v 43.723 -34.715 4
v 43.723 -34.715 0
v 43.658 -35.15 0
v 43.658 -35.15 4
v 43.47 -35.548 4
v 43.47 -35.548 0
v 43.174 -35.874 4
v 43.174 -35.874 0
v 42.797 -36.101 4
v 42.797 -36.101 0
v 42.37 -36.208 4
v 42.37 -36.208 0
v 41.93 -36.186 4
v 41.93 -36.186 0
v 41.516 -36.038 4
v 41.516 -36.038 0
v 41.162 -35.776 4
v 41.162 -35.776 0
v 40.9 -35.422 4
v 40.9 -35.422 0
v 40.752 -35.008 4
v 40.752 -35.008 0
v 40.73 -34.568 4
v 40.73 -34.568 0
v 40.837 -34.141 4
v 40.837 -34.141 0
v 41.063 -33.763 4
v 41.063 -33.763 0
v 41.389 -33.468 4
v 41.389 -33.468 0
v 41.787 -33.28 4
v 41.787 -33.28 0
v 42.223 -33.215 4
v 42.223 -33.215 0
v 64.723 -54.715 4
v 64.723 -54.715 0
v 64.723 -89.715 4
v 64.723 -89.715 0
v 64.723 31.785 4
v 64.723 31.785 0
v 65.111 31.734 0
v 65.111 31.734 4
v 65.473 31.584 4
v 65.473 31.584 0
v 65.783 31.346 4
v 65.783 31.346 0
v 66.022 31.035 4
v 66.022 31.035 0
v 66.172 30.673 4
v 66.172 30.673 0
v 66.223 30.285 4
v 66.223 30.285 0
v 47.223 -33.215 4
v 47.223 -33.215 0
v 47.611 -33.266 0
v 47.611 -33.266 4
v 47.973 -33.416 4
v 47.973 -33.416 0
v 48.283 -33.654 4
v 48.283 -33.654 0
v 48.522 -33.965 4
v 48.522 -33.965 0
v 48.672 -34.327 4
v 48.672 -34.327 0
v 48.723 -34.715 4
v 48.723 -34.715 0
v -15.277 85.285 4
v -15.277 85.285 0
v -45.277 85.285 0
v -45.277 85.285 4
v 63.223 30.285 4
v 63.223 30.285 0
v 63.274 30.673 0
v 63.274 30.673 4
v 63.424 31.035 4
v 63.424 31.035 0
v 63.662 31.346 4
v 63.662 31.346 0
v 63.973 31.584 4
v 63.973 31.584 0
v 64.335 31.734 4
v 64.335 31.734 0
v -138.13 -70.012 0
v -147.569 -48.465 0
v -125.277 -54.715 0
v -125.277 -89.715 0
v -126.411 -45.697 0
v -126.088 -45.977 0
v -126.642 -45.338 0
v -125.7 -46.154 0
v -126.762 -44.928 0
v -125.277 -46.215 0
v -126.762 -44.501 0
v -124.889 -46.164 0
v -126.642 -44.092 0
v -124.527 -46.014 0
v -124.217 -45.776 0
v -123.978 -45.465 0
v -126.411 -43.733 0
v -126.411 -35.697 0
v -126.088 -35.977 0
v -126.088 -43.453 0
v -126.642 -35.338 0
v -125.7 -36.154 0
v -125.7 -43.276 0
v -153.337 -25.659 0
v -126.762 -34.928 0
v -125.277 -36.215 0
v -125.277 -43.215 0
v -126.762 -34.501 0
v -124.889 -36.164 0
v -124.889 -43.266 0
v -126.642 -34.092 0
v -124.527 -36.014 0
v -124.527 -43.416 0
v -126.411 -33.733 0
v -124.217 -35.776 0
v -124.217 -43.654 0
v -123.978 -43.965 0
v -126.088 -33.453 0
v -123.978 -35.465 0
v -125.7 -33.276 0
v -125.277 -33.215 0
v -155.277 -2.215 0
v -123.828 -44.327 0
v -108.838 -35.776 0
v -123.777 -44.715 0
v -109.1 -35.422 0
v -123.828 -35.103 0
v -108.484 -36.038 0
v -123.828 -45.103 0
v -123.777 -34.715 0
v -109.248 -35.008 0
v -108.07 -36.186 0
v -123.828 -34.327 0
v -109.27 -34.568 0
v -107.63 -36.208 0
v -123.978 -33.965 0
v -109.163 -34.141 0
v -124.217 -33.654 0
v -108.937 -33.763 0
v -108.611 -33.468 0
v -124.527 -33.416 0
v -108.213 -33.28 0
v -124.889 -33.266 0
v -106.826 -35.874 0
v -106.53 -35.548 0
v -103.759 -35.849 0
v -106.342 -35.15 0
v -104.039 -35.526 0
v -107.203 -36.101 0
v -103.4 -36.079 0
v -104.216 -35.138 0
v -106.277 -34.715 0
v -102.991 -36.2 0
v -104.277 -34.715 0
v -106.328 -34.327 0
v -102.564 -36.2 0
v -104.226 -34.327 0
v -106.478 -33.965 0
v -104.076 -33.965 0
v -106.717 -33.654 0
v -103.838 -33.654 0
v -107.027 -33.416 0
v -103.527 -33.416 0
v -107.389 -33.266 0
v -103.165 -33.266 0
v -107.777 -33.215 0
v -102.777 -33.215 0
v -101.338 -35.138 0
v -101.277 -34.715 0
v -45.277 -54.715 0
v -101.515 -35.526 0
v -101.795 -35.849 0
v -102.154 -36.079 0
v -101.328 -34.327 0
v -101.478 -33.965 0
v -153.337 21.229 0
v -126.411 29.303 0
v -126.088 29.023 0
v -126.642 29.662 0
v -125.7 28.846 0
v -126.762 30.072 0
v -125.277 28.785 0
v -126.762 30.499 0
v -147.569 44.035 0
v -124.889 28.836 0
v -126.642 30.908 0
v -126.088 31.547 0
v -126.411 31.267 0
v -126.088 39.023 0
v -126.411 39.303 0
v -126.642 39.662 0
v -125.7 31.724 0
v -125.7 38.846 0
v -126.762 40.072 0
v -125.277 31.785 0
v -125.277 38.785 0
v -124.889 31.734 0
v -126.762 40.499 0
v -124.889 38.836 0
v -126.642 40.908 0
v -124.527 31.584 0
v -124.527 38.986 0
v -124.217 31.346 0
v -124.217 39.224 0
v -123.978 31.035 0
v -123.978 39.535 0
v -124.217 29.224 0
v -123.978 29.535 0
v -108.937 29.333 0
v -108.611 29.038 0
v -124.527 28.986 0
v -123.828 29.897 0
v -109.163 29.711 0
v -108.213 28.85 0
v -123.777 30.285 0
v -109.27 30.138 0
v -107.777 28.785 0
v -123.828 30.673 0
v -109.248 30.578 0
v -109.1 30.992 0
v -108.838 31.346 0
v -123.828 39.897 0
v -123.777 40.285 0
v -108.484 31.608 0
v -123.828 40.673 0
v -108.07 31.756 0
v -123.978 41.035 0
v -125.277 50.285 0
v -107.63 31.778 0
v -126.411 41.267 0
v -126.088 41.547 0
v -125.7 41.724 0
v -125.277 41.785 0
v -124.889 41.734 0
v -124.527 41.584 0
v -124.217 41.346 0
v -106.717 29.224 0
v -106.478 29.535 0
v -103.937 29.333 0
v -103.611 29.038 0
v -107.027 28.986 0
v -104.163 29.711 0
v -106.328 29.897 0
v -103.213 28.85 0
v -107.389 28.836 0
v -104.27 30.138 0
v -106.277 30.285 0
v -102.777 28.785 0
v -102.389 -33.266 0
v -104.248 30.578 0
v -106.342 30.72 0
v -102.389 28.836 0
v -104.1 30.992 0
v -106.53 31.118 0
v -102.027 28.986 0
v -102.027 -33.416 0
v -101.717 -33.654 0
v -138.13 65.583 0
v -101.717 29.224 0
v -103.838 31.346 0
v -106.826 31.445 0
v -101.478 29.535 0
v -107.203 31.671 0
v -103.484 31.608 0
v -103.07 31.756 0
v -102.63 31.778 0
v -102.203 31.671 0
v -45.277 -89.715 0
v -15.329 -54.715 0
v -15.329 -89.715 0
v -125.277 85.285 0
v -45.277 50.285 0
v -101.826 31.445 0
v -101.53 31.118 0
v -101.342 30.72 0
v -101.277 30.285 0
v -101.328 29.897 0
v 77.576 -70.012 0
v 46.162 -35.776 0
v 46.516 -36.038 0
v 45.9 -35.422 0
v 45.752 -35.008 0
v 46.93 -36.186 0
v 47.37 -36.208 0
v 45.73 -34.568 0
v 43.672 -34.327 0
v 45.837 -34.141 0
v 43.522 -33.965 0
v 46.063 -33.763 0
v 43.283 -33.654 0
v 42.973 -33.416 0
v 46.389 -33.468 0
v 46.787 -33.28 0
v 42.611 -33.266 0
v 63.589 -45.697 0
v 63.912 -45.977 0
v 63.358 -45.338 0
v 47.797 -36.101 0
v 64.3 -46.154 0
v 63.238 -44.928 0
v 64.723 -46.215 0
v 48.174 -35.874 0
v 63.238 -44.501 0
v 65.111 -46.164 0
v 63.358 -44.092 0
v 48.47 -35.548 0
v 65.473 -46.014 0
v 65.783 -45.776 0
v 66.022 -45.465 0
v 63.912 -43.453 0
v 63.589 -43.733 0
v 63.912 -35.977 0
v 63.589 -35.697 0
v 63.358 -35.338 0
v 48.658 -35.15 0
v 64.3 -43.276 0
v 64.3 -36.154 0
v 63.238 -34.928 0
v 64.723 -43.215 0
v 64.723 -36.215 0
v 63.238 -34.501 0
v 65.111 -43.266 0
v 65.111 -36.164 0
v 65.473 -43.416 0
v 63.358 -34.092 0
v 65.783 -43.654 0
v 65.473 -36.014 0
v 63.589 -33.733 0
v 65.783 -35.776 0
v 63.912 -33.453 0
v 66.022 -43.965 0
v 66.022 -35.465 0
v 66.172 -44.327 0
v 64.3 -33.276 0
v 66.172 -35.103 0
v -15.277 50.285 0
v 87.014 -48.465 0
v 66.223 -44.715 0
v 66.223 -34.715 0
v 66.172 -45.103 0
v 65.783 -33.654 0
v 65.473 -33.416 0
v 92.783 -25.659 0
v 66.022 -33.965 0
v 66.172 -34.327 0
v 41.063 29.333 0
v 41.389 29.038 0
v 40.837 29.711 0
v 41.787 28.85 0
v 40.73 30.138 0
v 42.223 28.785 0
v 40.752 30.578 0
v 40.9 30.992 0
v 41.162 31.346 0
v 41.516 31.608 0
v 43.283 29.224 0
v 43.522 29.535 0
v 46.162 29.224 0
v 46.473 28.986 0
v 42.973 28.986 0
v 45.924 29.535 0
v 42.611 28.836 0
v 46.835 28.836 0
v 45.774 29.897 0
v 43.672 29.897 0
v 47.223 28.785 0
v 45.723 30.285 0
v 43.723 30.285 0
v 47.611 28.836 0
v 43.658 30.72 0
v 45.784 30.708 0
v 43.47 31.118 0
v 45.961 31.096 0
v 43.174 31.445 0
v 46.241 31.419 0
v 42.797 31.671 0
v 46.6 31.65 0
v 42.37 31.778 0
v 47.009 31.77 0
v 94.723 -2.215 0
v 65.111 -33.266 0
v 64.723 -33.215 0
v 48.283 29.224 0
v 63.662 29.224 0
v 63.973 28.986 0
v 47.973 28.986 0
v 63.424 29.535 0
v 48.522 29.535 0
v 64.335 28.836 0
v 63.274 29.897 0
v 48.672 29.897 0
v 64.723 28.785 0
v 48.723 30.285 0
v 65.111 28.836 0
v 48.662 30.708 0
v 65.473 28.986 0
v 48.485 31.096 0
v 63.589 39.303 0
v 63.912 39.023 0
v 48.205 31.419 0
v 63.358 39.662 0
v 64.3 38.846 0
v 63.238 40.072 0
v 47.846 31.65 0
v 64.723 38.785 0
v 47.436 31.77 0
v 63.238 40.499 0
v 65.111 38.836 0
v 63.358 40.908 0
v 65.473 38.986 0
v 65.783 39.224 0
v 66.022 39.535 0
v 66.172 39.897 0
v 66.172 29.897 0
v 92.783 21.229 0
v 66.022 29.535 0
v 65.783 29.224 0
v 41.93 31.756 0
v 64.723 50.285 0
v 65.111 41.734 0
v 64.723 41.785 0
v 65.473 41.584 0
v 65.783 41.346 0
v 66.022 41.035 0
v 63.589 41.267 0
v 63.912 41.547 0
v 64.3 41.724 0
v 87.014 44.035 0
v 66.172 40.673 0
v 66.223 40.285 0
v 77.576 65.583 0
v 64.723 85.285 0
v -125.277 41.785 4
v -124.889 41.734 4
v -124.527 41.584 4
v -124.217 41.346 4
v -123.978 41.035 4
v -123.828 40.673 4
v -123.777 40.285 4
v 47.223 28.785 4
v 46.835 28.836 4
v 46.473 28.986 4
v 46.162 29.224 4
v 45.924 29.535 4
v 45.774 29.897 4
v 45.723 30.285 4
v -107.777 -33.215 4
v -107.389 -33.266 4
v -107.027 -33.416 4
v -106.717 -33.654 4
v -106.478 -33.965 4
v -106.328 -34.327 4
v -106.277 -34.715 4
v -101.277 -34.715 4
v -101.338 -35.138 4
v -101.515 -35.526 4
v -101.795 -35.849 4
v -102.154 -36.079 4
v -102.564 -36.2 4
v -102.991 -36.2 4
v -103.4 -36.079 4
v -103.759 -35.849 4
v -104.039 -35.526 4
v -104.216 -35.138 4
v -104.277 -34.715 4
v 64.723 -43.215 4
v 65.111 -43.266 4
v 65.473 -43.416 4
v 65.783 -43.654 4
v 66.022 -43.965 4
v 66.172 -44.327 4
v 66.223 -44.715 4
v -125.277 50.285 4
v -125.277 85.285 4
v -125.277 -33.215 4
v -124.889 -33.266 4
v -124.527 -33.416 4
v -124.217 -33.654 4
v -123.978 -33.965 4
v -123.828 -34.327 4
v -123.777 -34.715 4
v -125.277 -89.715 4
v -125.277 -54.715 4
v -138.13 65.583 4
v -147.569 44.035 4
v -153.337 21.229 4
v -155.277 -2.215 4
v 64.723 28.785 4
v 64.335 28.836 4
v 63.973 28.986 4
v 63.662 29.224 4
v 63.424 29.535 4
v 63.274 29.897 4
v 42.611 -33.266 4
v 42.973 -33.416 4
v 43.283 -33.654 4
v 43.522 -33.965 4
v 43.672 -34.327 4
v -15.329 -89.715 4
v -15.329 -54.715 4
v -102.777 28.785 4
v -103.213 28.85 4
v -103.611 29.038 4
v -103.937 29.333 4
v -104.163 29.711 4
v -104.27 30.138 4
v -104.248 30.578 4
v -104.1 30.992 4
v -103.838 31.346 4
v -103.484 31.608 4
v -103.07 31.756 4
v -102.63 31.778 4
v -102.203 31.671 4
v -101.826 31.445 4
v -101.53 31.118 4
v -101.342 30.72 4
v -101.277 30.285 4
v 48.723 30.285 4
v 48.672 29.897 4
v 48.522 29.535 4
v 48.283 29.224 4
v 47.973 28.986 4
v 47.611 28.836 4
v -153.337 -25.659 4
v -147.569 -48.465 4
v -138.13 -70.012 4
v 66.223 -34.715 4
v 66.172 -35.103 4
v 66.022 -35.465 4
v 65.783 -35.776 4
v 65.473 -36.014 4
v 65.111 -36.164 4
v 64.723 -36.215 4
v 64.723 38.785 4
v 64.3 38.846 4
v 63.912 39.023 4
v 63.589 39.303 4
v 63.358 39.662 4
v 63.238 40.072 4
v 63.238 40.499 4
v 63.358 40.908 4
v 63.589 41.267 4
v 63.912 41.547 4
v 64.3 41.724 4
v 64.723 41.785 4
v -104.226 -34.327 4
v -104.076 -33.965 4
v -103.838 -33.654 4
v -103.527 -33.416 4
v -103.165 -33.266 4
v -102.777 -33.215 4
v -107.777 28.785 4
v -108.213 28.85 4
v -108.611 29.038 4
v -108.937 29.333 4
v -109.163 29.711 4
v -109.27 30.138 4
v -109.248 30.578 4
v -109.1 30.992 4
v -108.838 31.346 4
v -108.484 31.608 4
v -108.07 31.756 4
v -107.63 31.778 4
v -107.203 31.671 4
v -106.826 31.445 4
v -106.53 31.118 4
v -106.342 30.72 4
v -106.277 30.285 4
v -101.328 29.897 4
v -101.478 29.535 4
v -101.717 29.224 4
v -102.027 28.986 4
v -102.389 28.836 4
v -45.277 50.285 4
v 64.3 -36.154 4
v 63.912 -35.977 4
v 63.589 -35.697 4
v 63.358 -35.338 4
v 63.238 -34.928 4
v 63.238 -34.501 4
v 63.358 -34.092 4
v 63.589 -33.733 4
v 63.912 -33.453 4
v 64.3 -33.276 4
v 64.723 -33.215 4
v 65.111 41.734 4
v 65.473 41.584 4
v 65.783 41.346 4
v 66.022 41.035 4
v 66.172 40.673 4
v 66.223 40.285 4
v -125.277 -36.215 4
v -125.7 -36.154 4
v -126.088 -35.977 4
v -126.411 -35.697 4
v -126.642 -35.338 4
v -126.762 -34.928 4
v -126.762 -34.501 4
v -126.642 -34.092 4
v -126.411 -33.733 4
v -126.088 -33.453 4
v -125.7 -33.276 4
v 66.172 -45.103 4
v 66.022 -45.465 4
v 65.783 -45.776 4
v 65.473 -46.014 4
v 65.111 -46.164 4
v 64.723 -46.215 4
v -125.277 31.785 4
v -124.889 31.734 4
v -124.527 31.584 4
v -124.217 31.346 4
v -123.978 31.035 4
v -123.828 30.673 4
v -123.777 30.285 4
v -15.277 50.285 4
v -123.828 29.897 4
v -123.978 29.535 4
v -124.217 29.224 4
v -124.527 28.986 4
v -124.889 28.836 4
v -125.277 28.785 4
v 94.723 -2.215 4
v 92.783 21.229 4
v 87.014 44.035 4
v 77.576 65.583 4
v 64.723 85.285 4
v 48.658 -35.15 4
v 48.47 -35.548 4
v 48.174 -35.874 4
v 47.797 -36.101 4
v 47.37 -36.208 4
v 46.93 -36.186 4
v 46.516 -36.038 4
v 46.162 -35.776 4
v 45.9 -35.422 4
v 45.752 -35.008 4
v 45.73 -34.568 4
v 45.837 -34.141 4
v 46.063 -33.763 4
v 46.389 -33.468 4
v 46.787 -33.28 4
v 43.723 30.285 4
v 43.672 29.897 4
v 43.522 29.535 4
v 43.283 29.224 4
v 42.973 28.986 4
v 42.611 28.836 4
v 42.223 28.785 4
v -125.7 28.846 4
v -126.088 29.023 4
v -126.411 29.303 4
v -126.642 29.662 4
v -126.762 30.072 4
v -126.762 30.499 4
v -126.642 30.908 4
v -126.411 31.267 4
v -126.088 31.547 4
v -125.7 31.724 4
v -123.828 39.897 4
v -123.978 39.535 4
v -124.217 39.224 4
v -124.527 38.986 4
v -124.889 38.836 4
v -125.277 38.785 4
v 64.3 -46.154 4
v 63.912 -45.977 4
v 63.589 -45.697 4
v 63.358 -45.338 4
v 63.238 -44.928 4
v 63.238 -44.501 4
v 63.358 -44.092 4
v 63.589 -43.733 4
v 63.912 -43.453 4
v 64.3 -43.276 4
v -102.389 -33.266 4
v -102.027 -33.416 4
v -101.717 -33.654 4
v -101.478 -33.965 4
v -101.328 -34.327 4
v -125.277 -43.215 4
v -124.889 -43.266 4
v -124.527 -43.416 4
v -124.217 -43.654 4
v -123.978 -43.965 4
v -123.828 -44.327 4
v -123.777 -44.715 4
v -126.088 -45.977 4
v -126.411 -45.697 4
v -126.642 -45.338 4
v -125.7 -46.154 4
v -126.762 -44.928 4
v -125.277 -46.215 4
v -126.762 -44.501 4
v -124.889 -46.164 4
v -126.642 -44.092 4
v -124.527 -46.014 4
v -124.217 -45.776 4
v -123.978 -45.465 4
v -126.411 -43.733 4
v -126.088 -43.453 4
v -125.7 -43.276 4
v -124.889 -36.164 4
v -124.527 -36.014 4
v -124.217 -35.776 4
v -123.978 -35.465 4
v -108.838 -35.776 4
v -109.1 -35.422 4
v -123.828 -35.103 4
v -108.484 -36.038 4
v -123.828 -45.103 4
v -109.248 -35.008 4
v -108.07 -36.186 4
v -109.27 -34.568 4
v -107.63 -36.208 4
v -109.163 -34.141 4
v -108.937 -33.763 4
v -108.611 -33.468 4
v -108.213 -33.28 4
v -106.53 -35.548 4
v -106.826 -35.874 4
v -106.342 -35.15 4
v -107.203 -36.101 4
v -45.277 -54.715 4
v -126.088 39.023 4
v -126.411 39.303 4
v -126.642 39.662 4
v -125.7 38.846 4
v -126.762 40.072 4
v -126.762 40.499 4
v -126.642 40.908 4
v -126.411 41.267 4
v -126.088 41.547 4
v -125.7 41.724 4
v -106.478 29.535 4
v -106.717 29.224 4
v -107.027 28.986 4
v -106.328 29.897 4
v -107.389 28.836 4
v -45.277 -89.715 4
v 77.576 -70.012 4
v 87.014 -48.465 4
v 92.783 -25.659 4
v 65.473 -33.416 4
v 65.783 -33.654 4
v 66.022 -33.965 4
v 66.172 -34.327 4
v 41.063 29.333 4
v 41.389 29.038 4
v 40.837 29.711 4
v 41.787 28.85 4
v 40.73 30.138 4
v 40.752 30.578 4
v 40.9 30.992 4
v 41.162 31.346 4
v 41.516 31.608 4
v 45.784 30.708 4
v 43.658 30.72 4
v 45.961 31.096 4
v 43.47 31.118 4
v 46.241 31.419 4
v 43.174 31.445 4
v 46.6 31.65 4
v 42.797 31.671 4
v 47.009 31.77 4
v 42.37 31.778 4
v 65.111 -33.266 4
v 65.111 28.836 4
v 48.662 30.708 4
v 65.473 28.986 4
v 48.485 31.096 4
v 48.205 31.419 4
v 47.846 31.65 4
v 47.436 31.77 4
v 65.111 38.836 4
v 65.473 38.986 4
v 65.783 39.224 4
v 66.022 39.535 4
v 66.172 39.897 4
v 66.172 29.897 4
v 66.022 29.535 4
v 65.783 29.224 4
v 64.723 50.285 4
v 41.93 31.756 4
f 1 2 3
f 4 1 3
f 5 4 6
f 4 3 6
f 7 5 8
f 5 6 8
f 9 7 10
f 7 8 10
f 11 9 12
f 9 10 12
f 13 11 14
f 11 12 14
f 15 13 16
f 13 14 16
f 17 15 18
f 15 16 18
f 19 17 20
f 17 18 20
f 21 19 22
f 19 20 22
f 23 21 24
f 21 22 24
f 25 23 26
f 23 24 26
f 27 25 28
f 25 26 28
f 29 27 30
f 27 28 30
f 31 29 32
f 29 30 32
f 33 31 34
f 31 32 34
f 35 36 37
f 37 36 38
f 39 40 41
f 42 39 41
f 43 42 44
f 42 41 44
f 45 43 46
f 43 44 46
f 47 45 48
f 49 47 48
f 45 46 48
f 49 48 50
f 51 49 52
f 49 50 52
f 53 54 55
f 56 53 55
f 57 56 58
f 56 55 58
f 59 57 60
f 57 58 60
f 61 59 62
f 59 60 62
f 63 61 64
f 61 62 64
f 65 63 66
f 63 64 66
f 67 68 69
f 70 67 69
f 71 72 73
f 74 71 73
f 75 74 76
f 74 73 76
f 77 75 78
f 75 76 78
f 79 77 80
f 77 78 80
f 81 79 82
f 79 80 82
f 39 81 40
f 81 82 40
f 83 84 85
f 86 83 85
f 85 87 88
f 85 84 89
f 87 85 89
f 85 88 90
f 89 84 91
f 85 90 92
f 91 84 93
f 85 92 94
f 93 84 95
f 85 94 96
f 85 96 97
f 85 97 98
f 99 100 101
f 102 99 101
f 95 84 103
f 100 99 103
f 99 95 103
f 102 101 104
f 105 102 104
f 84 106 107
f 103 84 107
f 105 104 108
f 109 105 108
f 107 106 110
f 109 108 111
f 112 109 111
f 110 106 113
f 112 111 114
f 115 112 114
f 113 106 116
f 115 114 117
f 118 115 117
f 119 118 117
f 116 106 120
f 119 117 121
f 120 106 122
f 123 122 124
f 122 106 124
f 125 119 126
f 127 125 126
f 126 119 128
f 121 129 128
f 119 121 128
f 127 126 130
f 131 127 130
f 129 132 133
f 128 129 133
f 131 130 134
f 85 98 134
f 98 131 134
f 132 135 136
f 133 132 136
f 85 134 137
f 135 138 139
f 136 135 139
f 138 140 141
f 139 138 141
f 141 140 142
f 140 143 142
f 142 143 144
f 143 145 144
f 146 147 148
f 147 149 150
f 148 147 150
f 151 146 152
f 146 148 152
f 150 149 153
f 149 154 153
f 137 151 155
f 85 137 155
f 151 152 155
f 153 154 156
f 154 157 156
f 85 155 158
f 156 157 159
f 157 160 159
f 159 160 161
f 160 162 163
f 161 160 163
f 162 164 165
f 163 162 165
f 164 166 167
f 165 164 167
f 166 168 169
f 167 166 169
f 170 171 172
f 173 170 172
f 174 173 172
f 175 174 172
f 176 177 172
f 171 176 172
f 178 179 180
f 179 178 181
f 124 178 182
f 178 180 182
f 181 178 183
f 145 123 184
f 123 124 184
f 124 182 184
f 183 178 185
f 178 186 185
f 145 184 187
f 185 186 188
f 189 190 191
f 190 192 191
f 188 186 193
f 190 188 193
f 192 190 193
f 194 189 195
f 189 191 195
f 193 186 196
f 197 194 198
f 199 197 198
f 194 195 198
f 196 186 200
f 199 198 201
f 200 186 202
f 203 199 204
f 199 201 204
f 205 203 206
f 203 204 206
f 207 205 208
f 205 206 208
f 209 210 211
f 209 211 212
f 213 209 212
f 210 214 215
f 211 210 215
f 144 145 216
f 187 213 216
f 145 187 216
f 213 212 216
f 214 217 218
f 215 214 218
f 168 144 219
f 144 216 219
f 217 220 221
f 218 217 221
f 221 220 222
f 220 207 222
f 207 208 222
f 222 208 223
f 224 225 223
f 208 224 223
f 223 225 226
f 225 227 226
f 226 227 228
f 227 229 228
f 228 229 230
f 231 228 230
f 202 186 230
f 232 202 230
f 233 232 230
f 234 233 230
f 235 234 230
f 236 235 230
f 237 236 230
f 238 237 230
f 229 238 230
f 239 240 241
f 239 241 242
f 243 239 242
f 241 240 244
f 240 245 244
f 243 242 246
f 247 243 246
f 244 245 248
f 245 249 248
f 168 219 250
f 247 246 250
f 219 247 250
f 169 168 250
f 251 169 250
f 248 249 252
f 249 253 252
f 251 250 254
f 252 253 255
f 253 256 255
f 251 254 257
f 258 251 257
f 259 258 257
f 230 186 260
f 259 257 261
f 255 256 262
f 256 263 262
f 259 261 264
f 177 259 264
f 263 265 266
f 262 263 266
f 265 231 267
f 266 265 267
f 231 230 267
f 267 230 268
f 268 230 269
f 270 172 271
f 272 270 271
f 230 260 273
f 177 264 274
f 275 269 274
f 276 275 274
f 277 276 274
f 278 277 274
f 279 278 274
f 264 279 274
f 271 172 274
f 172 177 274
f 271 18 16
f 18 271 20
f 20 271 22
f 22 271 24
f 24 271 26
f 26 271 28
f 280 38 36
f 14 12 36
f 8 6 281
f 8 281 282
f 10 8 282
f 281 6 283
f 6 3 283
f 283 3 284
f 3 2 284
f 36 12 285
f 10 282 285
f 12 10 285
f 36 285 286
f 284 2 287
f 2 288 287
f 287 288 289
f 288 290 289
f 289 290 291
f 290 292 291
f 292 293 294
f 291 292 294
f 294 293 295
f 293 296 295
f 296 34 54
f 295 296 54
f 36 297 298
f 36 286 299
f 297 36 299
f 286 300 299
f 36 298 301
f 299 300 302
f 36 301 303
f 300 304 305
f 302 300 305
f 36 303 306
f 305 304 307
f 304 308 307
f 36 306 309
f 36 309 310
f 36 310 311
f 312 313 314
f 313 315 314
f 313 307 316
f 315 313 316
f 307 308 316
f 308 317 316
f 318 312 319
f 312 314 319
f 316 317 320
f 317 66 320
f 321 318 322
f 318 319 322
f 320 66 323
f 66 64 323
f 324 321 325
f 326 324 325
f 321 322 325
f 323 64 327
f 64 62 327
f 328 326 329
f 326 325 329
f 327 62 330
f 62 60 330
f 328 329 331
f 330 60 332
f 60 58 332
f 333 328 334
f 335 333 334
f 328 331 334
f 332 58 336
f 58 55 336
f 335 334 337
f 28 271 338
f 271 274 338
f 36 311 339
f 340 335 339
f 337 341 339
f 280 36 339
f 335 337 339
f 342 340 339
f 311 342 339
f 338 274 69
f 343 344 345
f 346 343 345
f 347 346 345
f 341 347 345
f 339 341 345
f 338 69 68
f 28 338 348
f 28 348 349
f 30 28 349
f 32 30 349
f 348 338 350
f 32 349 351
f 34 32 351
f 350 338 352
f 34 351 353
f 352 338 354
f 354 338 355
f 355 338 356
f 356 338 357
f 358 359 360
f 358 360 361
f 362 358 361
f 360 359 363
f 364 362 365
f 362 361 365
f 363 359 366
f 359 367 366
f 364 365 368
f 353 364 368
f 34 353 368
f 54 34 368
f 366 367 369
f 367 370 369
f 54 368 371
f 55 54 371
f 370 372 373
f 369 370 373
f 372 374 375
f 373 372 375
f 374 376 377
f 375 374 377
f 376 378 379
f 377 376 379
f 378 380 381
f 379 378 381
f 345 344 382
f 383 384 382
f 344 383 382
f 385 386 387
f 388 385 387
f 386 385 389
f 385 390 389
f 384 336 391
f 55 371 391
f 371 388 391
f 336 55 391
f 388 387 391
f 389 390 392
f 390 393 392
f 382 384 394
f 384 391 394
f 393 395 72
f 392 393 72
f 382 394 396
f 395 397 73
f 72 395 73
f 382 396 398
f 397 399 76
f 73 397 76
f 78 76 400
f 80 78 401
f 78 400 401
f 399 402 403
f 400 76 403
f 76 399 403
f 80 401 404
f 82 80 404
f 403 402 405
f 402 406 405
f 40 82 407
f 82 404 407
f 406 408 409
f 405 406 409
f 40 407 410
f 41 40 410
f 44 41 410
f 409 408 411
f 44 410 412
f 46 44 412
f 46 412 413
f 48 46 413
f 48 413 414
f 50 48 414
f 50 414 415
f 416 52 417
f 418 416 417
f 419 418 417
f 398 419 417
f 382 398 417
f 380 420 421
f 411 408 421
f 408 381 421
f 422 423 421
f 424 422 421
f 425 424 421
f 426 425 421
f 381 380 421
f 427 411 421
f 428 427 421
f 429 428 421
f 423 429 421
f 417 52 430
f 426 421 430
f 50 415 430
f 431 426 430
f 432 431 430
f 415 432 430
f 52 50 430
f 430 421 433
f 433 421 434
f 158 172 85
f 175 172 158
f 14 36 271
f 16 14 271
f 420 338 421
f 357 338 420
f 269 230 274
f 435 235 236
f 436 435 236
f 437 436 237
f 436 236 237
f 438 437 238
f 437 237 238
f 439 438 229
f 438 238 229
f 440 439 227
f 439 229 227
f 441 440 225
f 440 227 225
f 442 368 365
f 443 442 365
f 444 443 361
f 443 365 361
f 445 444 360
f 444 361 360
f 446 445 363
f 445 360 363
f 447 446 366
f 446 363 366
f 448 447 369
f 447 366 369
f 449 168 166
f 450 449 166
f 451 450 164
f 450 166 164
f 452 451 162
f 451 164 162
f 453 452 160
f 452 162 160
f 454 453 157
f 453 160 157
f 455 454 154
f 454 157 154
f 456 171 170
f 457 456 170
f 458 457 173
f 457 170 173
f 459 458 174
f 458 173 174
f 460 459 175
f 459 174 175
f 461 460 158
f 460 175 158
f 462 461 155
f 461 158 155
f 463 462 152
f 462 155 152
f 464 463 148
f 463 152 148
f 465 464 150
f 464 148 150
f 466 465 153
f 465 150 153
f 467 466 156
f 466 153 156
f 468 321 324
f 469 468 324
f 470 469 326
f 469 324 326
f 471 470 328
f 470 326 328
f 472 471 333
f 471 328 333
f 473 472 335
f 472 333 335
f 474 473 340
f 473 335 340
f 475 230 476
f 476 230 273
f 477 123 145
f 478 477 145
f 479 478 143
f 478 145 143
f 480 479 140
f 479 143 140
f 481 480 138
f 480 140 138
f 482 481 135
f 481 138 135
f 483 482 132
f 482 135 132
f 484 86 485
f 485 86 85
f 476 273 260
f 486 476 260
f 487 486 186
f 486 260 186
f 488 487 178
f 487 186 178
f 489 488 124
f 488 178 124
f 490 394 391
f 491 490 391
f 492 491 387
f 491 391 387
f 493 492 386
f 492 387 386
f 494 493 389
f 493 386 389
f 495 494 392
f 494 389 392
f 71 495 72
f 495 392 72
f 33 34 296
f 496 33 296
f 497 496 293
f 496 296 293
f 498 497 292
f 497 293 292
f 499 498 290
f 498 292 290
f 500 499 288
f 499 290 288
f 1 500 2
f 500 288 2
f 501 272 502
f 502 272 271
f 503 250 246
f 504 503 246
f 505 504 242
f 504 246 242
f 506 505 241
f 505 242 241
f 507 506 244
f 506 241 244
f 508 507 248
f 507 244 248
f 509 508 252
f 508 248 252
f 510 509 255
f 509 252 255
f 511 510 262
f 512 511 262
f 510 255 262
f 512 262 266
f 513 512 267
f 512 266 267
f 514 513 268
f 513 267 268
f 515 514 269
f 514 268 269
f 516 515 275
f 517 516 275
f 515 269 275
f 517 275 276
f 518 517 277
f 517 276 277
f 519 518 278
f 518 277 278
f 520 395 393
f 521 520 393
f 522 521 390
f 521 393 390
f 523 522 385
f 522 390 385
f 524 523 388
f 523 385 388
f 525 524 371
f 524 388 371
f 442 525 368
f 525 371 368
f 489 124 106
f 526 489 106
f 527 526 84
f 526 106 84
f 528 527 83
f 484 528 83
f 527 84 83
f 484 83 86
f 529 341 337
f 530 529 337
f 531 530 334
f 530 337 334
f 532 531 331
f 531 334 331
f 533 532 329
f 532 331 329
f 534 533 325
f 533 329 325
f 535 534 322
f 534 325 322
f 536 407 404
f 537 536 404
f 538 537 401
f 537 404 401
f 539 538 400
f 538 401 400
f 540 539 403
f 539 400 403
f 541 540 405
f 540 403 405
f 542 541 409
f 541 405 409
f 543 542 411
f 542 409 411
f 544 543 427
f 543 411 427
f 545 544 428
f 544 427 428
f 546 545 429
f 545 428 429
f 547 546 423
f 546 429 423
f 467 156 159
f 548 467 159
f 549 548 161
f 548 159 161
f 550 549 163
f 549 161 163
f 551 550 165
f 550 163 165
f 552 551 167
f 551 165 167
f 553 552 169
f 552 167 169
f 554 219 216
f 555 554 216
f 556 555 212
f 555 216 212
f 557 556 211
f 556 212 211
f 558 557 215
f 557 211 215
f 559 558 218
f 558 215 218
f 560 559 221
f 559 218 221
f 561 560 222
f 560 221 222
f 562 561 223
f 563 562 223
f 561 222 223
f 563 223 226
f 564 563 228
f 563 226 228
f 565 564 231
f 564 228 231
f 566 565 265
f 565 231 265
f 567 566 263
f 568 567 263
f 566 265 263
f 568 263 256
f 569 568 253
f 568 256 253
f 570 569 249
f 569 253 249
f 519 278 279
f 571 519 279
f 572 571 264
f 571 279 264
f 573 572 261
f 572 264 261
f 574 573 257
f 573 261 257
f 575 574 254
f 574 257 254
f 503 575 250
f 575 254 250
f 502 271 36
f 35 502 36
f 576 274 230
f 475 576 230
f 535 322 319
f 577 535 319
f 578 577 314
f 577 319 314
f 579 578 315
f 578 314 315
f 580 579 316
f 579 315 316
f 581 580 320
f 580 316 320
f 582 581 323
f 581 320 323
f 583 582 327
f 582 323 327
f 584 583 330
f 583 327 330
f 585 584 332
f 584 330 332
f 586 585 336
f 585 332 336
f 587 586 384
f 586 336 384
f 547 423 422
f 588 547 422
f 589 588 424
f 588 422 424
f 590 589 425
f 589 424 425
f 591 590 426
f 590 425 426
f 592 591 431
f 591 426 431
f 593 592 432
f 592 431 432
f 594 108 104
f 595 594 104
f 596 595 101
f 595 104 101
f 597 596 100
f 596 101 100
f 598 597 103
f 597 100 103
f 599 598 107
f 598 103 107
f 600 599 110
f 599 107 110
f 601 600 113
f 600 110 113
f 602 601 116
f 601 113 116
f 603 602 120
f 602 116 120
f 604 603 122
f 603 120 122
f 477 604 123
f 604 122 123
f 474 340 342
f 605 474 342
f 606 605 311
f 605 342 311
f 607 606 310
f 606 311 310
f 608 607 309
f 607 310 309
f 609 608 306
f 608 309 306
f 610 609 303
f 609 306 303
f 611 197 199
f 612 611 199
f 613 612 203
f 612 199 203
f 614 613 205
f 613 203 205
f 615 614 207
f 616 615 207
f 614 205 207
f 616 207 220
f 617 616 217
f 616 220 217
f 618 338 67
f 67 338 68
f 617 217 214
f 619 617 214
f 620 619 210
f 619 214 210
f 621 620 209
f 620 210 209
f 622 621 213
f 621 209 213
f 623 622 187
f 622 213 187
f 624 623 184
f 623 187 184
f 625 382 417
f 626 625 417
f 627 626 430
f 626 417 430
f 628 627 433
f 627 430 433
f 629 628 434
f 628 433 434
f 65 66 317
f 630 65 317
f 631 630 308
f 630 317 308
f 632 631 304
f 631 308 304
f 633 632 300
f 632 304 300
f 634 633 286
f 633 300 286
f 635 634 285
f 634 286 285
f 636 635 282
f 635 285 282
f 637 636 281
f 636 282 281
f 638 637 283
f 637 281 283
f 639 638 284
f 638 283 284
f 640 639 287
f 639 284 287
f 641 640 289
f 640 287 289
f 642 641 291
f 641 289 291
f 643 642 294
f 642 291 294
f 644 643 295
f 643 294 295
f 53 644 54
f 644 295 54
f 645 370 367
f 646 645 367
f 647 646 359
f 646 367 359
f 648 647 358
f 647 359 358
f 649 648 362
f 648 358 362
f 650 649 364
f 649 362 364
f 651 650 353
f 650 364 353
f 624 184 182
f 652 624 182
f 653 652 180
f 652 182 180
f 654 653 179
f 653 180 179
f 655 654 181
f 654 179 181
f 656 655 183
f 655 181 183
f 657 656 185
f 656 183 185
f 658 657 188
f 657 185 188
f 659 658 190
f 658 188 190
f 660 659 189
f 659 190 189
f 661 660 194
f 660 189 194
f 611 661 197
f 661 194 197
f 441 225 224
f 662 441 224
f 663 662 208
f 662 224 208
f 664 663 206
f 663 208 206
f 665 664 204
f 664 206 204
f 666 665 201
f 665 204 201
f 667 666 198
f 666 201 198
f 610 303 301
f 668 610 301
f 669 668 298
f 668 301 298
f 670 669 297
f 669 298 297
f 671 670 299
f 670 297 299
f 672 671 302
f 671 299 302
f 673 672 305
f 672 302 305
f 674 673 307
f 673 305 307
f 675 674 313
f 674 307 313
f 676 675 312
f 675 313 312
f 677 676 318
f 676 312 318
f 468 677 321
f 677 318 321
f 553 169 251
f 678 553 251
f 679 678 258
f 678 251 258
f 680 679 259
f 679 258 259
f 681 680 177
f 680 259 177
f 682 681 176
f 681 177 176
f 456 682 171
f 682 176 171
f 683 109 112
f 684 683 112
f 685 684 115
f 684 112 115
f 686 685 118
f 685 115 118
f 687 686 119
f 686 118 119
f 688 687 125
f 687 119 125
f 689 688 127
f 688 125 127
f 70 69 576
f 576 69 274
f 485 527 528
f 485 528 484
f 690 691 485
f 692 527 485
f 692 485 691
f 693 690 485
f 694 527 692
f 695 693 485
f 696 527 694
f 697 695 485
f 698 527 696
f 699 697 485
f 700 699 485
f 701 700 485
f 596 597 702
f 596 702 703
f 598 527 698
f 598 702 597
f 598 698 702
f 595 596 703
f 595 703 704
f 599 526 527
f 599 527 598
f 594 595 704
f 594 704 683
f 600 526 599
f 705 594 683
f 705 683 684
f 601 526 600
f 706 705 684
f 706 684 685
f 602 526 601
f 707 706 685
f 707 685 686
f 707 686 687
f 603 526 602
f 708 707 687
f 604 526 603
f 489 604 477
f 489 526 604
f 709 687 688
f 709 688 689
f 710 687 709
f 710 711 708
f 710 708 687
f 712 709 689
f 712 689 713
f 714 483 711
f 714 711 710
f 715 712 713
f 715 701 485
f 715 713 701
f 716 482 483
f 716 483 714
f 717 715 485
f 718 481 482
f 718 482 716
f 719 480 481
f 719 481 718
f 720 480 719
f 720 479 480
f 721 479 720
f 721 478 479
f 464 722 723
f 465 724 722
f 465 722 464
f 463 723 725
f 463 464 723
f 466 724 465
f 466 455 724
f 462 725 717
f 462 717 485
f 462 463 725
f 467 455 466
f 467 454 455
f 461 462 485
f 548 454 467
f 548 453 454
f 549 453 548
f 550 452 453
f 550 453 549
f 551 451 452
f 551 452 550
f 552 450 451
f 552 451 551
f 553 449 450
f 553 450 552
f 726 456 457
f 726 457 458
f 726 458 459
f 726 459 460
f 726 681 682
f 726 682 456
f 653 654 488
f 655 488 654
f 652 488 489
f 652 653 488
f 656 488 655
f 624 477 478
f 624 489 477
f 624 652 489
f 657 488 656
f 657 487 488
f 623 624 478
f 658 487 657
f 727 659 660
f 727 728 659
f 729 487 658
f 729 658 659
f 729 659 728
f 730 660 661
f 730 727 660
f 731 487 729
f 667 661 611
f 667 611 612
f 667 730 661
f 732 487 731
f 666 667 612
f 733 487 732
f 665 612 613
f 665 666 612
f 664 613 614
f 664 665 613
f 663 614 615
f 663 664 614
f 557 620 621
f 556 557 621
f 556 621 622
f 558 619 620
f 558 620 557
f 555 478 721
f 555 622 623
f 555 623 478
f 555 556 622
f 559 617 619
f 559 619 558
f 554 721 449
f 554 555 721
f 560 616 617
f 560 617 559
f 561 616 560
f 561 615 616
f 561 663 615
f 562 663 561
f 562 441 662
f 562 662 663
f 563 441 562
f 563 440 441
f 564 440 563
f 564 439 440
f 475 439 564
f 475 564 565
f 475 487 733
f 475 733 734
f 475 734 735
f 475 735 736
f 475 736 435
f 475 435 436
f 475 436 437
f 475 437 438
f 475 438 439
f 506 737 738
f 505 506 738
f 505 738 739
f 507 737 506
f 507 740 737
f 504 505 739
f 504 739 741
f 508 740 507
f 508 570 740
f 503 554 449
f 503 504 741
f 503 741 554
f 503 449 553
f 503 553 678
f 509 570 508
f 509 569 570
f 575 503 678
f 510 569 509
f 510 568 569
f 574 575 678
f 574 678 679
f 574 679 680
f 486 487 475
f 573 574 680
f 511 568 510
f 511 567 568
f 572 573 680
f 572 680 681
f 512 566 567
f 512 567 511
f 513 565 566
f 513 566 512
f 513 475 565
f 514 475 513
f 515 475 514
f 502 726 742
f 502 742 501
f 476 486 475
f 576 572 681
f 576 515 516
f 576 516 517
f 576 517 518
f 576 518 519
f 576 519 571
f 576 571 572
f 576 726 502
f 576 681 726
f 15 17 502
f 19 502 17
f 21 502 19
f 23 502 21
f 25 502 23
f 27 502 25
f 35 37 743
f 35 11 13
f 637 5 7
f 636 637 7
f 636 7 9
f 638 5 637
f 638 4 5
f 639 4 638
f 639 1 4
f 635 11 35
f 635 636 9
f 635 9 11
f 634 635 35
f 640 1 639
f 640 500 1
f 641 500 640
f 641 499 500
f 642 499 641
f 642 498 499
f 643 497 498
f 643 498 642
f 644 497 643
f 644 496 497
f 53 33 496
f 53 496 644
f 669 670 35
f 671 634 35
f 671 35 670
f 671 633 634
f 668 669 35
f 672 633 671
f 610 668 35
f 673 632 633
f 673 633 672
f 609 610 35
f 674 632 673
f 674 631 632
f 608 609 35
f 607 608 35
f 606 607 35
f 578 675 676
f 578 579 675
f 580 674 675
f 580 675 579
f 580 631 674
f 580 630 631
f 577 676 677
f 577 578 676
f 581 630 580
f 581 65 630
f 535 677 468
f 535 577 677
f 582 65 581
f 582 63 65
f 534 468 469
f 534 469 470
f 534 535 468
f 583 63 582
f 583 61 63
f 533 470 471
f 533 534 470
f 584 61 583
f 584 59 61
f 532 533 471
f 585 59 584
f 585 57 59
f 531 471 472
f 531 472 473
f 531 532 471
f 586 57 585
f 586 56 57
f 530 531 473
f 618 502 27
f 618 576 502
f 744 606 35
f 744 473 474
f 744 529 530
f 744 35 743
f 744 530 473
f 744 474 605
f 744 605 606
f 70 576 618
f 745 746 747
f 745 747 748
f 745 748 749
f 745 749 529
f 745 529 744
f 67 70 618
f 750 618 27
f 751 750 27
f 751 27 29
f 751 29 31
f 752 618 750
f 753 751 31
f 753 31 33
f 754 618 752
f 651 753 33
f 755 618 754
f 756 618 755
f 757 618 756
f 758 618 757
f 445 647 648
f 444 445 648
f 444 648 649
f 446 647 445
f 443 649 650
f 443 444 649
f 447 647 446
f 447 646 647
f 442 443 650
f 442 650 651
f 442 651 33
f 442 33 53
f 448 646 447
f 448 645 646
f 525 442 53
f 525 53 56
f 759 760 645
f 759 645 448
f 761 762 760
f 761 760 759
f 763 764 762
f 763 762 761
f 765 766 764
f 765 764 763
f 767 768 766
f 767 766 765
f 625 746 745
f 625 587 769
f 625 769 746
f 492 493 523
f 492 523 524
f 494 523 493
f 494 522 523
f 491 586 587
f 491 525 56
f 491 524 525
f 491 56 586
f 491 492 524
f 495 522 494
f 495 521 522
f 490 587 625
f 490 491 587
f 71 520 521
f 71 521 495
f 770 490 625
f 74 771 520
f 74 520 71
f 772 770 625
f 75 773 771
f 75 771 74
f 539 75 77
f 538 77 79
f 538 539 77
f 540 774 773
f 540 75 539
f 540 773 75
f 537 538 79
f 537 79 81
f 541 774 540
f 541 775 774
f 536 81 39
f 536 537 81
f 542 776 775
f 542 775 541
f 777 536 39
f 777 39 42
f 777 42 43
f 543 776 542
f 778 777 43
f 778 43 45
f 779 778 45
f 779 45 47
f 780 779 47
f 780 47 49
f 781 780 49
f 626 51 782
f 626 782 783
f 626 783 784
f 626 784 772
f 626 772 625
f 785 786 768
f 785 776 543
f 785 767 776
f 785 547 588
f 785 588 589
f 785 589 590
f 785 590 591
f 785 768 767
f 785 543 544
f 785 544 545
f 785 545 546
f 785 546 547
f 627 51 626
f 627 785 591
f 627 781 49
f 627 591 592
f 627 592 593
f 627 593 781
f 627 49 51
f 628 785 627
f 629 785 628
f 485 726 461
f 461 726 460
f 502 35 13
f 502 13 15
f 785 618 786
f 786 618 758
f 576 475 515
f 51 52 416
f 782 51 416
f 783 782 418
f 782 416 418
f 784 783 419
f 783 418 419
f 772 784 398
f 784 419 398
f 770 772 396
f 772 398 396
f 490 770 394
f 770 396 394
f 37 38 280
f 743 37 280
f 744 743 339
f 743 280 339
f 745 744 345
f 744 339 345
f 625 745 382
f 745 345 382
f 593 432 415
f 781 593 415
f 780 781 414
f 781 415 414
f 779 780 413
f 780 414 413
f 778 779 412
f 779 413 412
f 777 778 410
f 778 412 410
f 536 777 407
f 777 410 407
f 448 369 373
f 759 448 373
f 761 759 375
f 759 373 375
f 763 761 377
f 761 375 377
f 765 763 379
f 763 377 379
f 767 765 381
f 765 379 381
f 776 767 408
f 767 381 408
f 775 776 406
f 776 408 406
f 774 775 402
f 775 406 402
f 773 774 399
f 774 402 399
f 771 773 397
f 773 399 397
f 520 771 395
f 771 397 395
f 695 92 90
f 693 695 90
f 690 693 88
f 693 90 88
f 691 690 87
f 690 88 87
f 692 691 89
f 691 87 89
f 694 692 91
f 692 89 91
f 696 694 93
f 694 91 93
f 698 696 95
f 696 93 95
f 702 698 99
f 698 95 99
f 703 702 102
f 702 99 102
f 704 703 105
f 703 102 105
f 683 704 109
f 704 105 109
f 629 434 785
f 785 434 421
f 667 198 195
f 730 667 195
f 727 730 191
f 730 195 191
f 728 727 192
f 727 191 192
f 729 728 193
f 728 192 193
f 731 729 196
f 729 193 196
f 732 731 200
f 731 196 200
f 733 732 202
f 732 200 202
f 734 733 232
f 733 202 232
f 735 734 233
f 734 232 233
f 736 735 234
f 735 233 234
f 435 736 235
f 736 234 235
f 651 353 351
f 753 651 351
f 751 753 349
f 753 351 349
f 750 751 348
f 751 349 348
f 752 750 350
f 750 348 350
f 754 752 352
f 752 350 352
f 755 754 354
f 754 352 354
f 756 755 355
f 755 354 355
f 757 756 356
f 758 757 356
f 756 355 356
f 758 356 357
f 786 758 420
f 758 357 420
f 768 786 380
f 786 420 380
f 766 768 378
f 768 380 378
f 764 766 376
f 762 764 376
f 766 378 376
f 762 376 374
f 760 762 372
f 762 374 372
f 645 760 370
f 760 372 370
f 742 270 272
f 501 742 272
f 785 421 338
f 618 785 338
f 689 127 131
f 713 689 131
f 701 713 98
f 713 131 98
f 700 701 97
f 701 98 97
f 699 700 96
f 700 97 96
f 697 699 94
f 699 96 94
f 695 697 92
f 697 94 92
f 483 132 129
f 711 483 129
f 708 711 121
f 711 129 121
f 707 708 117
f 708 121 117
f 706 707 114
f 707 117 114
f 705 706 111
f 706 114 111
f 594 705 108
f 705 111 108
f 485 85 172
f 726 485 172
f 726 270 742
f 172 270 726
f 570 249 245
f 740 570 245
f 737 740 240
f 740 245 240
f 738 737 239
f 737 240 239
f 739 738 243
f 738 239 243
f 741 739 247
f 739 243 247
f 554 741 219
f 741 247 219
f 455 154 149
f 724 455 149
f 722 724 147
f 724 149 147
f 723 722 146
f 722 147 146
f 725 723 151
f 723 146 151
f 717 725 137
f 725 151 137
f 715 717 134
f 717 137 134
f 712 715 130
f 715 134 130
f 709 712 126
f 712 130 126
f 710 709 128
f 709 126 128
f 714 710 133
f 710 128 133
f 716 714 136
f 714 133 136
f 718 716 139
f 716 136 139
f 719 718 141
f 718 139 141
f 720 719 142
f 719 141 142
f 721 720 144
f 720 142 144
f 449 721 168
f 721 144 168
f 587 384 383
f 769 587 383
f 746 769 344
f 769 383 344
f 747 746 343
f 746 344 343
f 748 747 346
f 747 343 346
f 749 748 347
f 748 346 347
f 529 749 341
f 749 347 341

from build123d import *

# Parameters (mm, degrees)
F0_W     = 15
F0_H     = 4.4212083991
F0_H_2   = 48.0787916009
F0_W_2   = 29.9482679234
F0_H_3   = 35
F1_DEPTH = 4
F2_DEPTH = 4


with BuildPart() as f1:
    # F0 (on Top) → F1 (new body)
    with BuildSketch(Plane.XY):
        with BuildLine():
            Line((-125.2771986143, 41.785060304), (-125.2771986143, 50.285060304))
            Line((-125.2771986143, 50.285060304), (-125.2771986143, 85.285060304))
            ThreePointArc((-125.2771986143, 85.285060304), (-147.5688652809, 44.035060304), (-155.2771986143, -2.214939696))
            Line((-155.2771986143, -2.214939696), (-125.2771986143, -2.214939696))
            Line((-125.2771986143, -2.214939696), (-125.2771986143, 28.785060304))
            ThreePointArc((-125.2771986143, 28.785060304), (-126.7771986143, 30.285060304), (-125.2771986143, 31.785060304))
            Line((-125.2771986143, 31.785060304), (-125.2771986143, 38.785060304))
            ThreePointArc((-125.2771986143, 38.785060304), (-126.7771986143, 40.285060304), (-125.2771986143, 41.785060304))
        make_face()
        with BuildLine():
            Line((-85.2771986143, 50.285060304), (-125.2771986143, 50.285060304))
            Line((-125.2771986143, 50.285060304), (-125.2771986143, 41.785060304))
            ThreePointArc((-125.2771986143, 41.785060304), (-124.2165384425, 41.3457204758), (-123.7771986143, 40.285060304))
            ThreePointArc((-123.7771986143, 40.285060304), (-124.2165384425, 39.2244001322), (-125.2771986143, 38.785060304))
            Line((-125.2771986143, 38.785060304), (-125.2771986143, 31.785060304))
            ThreePointArc((-125.2771986143, 31.785060304), (-124.2165384425, 31.3457204758), (-123.7771986143, 30.285060304))
            ThreePointArc((-123.7771986143, 30.285060304), (-124.2165384425, 29.2244001322), (-125.2771986143, 28.785060304))
            Line((-125.2771986143, 28.785060304), (-125.2771986143, -2.214939696))
            Line((-125.2771986143, -2.214939696), (-107.7771986143, -2.214939696))
            Line((-107.7771986143, -2.214939696), (-102.7771986143, -2.214939696))
            Line((-102.7771986143, -2.214939696), (-85.2771986143, -2.214939696))
            Line((-85.2771986143, -2.214939696), (-85.2771986143, 50.285060304))
        make_face()
        with BuildLine():
            ThreePointArc((-106.2771986143, 30.285060304), (-106.7165384425, 29.2244001322), (-107.7771986143, 28.785060304))
            ThreePointArc((-107.7771986143, 28.785060304), (-108.837858786, 31.3457204758), (-106.2771986143, 30.285060304))
        make_face(mode=Mode.SUBTRACT)
        with BuildLine():
            ThreePointArc((-101.2771986143, 30.285060304), (-101.7165384425, 29.2244001322), (-102.7771986143, 28.785060304))
            ThreePointArc((-102.7771986143, 28.785060304), (-103.837858786, 31.3457204758), (-101.2771986143, 30.285060304))
        make_face(mode=Mode.SUBTRACT)
        Polygon((-45.2771986143, 50.285060304), (-85.2771986143, 50.285060304), (-85.2771986143, -2.214939696), (-45.2771986143, -2.214939696), (-45.2771986143, 45.8638519049), align=None)
        with Locations((-37.7771986143, 48.0744561044)):
            Rectangle(F0_W, F0_H)
        Polygon((-45.2771986143, 85.285060304), (-45.2771986143, 50.285060304), (-30.2771986143, 50.285060304), (-15.2771986143, 50.285060304), (-15.2771986143, 85.285060304), align=None)
        Polygon((-45.2771986143, -2.214939696), (-85.2771986143, -2.214939696), (-85.2771986143, -34.714939696), (-85.2771986143, -54.714939696), (-45.2771986143, -54.714939696), align=None)
        with BuildLine():
            Line((-125.2771986143, -2.214939696), (-155.2771986143, -2.214939696))
            ThreePointArc((-155.2771986143, -2.214939696), (-147.5688652809, -48.464939696), (-125.2771986143, -89.714939696))
            Line((-125.2771986143, -89.714939696), (-125.2771986143, -54.714939696))
            Line((-125.2771986143, -54.714939696), (-125.2771986143, -46.214939696))
            ThreePointArc((-125.2771986143, -46.214939696), (-126.7771986143, -44.714939696), (-125.2771986143, -43.214939696))
            Line((-125.2771986143, -43.214939696), (-125.2771986143, -36.214939696))
            ThreePointArc((-125.2771986143, -36.214939696), (-126.7771986143, -34.714939696), (-125.2771986143, -33.214939696))
            Line((-125.2771986143, -33.214939696), (-125.2771986143, -2.214939696))
        make_face()
        with Locations((-37.7771986143, 21.8244561044)):
            Rectangle(F0_W, F0_H_2)
        with Locations((-22.7771986143, 48.0744561044)):
            Rectangle(F0_W, F0_H)
        Polygon((-30.2771986143, -2.214939696), (-45.2771986143, -2.214939696), (-45.2771986143, -54.714939696), (-15.3289306909, -54.714939696), (-15.2771986143, -54.714939696), (-15.2771986143, -2.214939696), align=None)
        with Locations((-22.7771986143, 21.8244561044)):
            Rectangle(F0_W, F0_H_2)
        with BuildLine():
            Line((64.7228013857, 50.285060304), (-15.2771986143, 50.285060304))
            Line((-15.2771986143, 50.285060304), (-15.2771986143, 45.8638519049))
            Line((-15.2771986143, 45.8638519049), (-15.2771986143, -2.214939696))
            Line((-15.2771986143, -2.214939696), (42.2228013857, -2.214939696))
            Line((42.2228013857, -2.214939696), (42.2228013857, 28.785060304))
            ThreePointArc((42.2228013857, 28.785060304), (41.162141214, 31.3457204758), (43.7228013857, 30.285060304))
            Line((43.7228013857, 30.285060304), (45.7228013857, 30.285060304))
            ThreePointArc((45.7228013857, 30.285060304), (47.2228013857, 31.785060304), (48.7228013857, 30.285060304))
            Line((48.7228013857, 30.285060304), (63.2228013857, 30.285060304))
            ThreePointArc((63.2228013857, 30.285060304), (63.662141214, 31.3457204758), (64.7228013857, 31.785060304))
            Line((64.7228013857, 31.785060304), (64.7228013857, 38.785060304))
            ThreePointArc((64.7228013857, 38.785060304), (63.2228013857, 40.285060304), (64.7228013857, 41.785060304))
            Line((64.7228013857, 41.785060304), (64.7228013857, 50.285060304))
        make_face()
        with Locations((-30.3030646526, -72.214939696)):
            Rectangle(F0_W_2, F0_H_3)
        with BuildLine():
            Line((64.7228013857, 85.285060304), (64.7228013857, 50.285060304))
            Line((64.7228013857, 50.285060304), (64.7228013857, 41.785060304))
            ThreePointArc((64.7228013857, 41.785060304), (65.7834615575, 41.3457204758), (66.2228013857, 40.285060304))
            ThreePointArc((66.2228013857, 40.285060304), (65.7834615575, 39.2244001322), (64.7228013857, 38.785060304))
            Line((64.7228013857, 38.785060304), (64.7228013857, 31.785060304))
            ThreePointArc((64.7228013857, 31.785060304), (65.7834615575, 31.3457204758), (66.2228013857, 30.285060304))
            ThreePointArc((66.2228013857, 30.285060304), (65.7834615575, 29.2244001322), (64.7228013857, 28.785060304))
            Line((64.7228013857, 28.785060304), (64.7228013857, -2.214939696))
            Line((64.7228013857, -2.214939696), (94.7228013857, -2.214939696))
            ThreePointArc((94.7228013857, -2.214939696), (87.0144680524, 44.035060304), (64.7228013857, 85.285060304))
        make_face()
        with BuildLine():
            Line((42.2228013857, -2.214939696), (-15.2771986143, -2.214939696))
            Line((-15.2771986143, -2.214939696), (-15.2771986143, -54.714939696))
            Line((-15.2771986143, -54.714939696), (64.7228013857, -54.714939696))
            Line((64.7228013857, -54.714939696), (64.7228013857, -46.214939696))
            ThreePointArc((64.7228013857, -46.214939696), (63.2228013857, -44.714939696), (64.7228013857, -43.214939696))
            Line((64.7228013857, -43.214939696), (64.7228013857, -36.214939696))
            ThreePointArc((64.7228013857, -36.214939696), (63.2228013857, -34.714939696), (64.7228013857, -33.214939696))
            Line((64.7228013857, -33.214939696), (64.7228013857, -2.214939696))
            Line((64.7228013857, -2.214939696), (47.2228013857, -2.214939696))
            Line((47.2228013857, -2.214939696), (42.2228013857, -2.214939696))
        make_face()
        with BuildLine():
            ThreePointArc((43.7228013857, -34.714939696), (41.162141214, -35.7755998678), (42.2228013857, -33.214939696))
            ThreePointArc((42.2228013857, -33.214939696), (43.2834615575, -33.6542795242), (43.7228013857, -34.714939696))
        make_face(mode=Mode.SUBTRACT)
        with BuildLine():
            ThreePointArc((48.7228013857, -34.714939696), (46.162141214, -35.7755998678), (47.2228013857, -33.214939696))
            ThreePointArc((47.2228013857, -33.214939696), (48.2834615575, -33.6542795242), (48.7228013857, -34.714939696))
        make_face(mode=Mode.SUBTRACT)
        with BuildLine():
            Line((42.2228013857, 28.785060304), (42.2228013857, -2.214939696))
            Line((42.2228013857, -2.214939696), (47.2228013857, -2.214939696))
            Line((47.2228013857, -2.214939696), (47.2228013857, 28.785060304))
            ThreePointArc((47.2228013857, 28.785060304), (46.162141214, 29.2244001322), (45.7228013857, 30.285060304))
            Line((45.7228013857, 30.285060304), (43.7228013857, 30.285060304))
            ThreePointArc((43.7228013857, 30.285060304), (43.2834615575, 29.2244001322), (42.2228013857, 28.785060304))
        make_face()
        with BuildLine():
            ThreePointArc((64.7228013857, -89.714939696), (87.0144680524, -48.464939696), (94.7228013857, -2.214939696))
            Line((94.7228013857, -2.214939696), (64.7228013857, -2.214939696))
            Line((64.7228013857, -2.214939696), (64.7228013857, -33.214939696))
            ThreePointArc((64.7228013857, -33.214939696), (65.7834615575, -33.6542795242), (66.2228013857, -34.714939696))
            ThreePointArc((66.2228013857, -34.714939696), (65.7834615575, -35.7755998678), (64.7228013857, -36.214939696))
            Line((64.7228013857, -36.214939696), (64.7228013857, -43.214939696))
            ThreePointArc((64.7228013857, -43.214939696), (65.7834615575, -43.6542795242), (66.2228013857, -44.714939696))
            ThreePointArc((66.2228013857, -44.714939696), (65.7834615575, -45.7755998678), (64.7228013857, -46.214939696))
            Line((64.7228013857, -46.214939696), (64.7228013857, -54.714939696))
            Line((64.7228013857, -54.714939696), (64.7228013857, -89.714939696))
        make_face()
        with BuildLine():
            Line((47.2228013857, 28.785060304), (47.2228013857, -2.214939696))
            Line((47.2228013857, -2.214939696), (64.7228013857, -2.214939696))
            Line((64.7228013857, -2.214939696), (64.7228013857, 28.785060304))
            ThreePointArc((64.7228013857, 28.785060304), (63.662141214, 29.2244001322), (63.2228013857, 30.285060304))
            Line((63.2228013857, 30.285060304), (48.7228013857, 30.285060304))
            ThreePointArc((48.7228013857, 30.285060304), (48.2834615575, 29.2244001322), (47.2228013857, 28.785060304))
        make_face()
    extrude(amount=F1_DEPTH)

    # F0 (on Top) → F2 (join)
    with BuildSketch(Plane.XY):
        with BuildLine():
            Line((-85.2771986143, -54.714939696), (-85.2771986143, -34.714939696))
            Line((-85.2771986143, -34.714939696), (-101.2771986143, -34.714939696))
            ThreePointArc((-101.2771986143, -34.714939696), (-102.7771986143, -36.214939696), (-104.2771986143, -34.714939696))
            ThreePointArc((-104.2771986143, -34.714939696), (-105.2771986143, -35.714939696), (-106.2771986143, -34.714939696))
            ThreePointArc((-106.2771986143, -34.714939696), (-108.837858786, -35.7755998678), (-107.7771986143, -33.214939696))
            Line((-107.7771986143, -33.214939696), (-107.7771986143, -2.214939696))
            Line((-107.7771986143, -2.214939696), (-125.2771986143, -2.214939696))
            Line((-125.2771986143, -2.214939696), (-125.2771986143, -33.214939696))
            ThreePointArc((-125.2771986143, -33.214939696), (-124.2165384425, -33.6542795242), (-123.7771986143, -34.714939696))
            ThreePointArc((-123.7771986143, -34.714939696), (-124.2165384425, -35.7755998678), (-125.2771986143, -36.214939696))
            Line((-125.2771986143, -36.214939696), (-125.2771986143, -43.214939696))
            ThreePointArc((-125.2771986143, -43.214939696), (-124.2165384425, -43.6542795242), (-123.7771986143, -44.714939696))
            ThreePointArc((-123.7771986143, -44.714939696), (-124.2165384425, -45.7755998678), (-125.2771986143, -46.214939696))
            Line((-125.2771986143, -46.214939696), (-125.2771986143, -54.714939696))
            Line((-125.2771986143, -54.714939696), (-85.2771986143, -54.714939696))
        make_face()
        with BuildLine():
            ThreePointArc((-106.2771986143, -34.714939696), (-105.2771986143, -35.714939696), (-104.2771986143, -34.714939696))
            Line((-104.2771986143, -34.714939696), (-105.2771986143, -34.714939696))
            Line((-105.2771986143, -34.714939696), (-106.2771986143, -34.714939696))
        make_face()
        with BuildLine():
            Line((-105.2771986143, -34.714939696), (-104.2771986143, -34.714939696))
            ThreePointArc((-104.2771986143, -34.714939696), (-105.2771986143, -33.714939696), (-106.2771986143, -34.714939696))
            Line((-106.2771986143, -34.714939696), (-105.2771986143, -34.714939696))
        make_face()
        with BuildLine():
            Line((-102.7771986143, -33.214939696), (-102.7771986143, -2.214939696))
            Line((-102.7771986143, -2.214939696), (-107.7771986143, -2.214939696))
            Line((-107.7771986143, -2.214939696), (-107.7771986143, -33.214939696))
            ThreePointArc((-107.7771986143, -33.214939696), (-106.7165384425, -33.6542795242), (-106.2771986143, -34.714939696))
            ThreePointArc((-106.2771986143, -34.714939696), (-105.2771986143, -33.714939696), (-104.2771986143, -34.714939696))
            ThreePointArc((-104.2771986143, -34.714939696), (-103.837858786, -33.6542795242), (-102.7771986143, -33.214939696))
        make_face()
        with BuildLine():
            Line((-85.2771986143, -34.714939696), (-85.2771986143, -2.214939696))
            Line((-85.2771986143, -2.214939696), (-102.7771986143, -2.214939696))
            Line((-102.7771986143, -2.214939696), (-102.7771986143, -33.214939696))
            ThreePointArc((-102.7771986143, -33.214939696), (-101.7165384425, -33.6542795242), (-101.2771986143, -34.714939696))
            Line((-101.2771986143, -34.714939696), (-85.2771986143, -34.714939696))
        make_face()
        with BuildLine():
            Line((42.2228013857, -2.214939696), (-15.2771986143, -2.214939696))
            Line((-15.2771986143, -2.214939696), (-15.2771986143, -54.714939696))
            Line((-15.2771986143, -54.714939696), (64.7228013857, -54.714939696))
            Line((64.7228013857, -54.714939696), (64.7228013857, -46.214939696))
            ThreePointArc((64.7228013857, -46.214939696), (63.2228013857, -44.714939696), (64.7228013857, -43.214939696))
            Line((64.7228013857, -43.214939696), (64.7228013857, -36.214939696))
            ThreePointArc((64.7228013857, -36.214939696), (63.2228013857, -34.714939696), (64.7228013857, -33.214939696))
            Line((64.7228013857, -33.214939696), (64.7228013857, -2.214939696))
            Line((64.7228013857, -2.214939696), (47.2228013857, -2.214939696))
            Line((47.2228013857, -2.214939696), (42.2228013857, -2.214939696))
        make_face()
        with BuildLine():
            ThreePointArc((43.7228013857, -34.714939696), (41.162141214, -35.7755998678), (42.2228013857, -33.214939696))
            ThreePointArc((42.2228013857, -33.214939696), (43.2834615575, -33.6542795242), (43.7228013857, -34.714939696))
        make_face(mode=Mode.SUBTRACT)
        with BuildLine():
            ThreePointArc((48.7228013857, -34.714939696), (46.162141214, -35.7755998678), (47.2228013857, -33.214939696))
            ThreePointArc((47.2228013857, -33.214939696), (48.2834615575, -33.6542795242), (48.7228013857, -34.714939696))
        make_face(mode=Mode.SUBTRACT)
    extrude(amount=F2_DEPTH)


solid = f1.part
